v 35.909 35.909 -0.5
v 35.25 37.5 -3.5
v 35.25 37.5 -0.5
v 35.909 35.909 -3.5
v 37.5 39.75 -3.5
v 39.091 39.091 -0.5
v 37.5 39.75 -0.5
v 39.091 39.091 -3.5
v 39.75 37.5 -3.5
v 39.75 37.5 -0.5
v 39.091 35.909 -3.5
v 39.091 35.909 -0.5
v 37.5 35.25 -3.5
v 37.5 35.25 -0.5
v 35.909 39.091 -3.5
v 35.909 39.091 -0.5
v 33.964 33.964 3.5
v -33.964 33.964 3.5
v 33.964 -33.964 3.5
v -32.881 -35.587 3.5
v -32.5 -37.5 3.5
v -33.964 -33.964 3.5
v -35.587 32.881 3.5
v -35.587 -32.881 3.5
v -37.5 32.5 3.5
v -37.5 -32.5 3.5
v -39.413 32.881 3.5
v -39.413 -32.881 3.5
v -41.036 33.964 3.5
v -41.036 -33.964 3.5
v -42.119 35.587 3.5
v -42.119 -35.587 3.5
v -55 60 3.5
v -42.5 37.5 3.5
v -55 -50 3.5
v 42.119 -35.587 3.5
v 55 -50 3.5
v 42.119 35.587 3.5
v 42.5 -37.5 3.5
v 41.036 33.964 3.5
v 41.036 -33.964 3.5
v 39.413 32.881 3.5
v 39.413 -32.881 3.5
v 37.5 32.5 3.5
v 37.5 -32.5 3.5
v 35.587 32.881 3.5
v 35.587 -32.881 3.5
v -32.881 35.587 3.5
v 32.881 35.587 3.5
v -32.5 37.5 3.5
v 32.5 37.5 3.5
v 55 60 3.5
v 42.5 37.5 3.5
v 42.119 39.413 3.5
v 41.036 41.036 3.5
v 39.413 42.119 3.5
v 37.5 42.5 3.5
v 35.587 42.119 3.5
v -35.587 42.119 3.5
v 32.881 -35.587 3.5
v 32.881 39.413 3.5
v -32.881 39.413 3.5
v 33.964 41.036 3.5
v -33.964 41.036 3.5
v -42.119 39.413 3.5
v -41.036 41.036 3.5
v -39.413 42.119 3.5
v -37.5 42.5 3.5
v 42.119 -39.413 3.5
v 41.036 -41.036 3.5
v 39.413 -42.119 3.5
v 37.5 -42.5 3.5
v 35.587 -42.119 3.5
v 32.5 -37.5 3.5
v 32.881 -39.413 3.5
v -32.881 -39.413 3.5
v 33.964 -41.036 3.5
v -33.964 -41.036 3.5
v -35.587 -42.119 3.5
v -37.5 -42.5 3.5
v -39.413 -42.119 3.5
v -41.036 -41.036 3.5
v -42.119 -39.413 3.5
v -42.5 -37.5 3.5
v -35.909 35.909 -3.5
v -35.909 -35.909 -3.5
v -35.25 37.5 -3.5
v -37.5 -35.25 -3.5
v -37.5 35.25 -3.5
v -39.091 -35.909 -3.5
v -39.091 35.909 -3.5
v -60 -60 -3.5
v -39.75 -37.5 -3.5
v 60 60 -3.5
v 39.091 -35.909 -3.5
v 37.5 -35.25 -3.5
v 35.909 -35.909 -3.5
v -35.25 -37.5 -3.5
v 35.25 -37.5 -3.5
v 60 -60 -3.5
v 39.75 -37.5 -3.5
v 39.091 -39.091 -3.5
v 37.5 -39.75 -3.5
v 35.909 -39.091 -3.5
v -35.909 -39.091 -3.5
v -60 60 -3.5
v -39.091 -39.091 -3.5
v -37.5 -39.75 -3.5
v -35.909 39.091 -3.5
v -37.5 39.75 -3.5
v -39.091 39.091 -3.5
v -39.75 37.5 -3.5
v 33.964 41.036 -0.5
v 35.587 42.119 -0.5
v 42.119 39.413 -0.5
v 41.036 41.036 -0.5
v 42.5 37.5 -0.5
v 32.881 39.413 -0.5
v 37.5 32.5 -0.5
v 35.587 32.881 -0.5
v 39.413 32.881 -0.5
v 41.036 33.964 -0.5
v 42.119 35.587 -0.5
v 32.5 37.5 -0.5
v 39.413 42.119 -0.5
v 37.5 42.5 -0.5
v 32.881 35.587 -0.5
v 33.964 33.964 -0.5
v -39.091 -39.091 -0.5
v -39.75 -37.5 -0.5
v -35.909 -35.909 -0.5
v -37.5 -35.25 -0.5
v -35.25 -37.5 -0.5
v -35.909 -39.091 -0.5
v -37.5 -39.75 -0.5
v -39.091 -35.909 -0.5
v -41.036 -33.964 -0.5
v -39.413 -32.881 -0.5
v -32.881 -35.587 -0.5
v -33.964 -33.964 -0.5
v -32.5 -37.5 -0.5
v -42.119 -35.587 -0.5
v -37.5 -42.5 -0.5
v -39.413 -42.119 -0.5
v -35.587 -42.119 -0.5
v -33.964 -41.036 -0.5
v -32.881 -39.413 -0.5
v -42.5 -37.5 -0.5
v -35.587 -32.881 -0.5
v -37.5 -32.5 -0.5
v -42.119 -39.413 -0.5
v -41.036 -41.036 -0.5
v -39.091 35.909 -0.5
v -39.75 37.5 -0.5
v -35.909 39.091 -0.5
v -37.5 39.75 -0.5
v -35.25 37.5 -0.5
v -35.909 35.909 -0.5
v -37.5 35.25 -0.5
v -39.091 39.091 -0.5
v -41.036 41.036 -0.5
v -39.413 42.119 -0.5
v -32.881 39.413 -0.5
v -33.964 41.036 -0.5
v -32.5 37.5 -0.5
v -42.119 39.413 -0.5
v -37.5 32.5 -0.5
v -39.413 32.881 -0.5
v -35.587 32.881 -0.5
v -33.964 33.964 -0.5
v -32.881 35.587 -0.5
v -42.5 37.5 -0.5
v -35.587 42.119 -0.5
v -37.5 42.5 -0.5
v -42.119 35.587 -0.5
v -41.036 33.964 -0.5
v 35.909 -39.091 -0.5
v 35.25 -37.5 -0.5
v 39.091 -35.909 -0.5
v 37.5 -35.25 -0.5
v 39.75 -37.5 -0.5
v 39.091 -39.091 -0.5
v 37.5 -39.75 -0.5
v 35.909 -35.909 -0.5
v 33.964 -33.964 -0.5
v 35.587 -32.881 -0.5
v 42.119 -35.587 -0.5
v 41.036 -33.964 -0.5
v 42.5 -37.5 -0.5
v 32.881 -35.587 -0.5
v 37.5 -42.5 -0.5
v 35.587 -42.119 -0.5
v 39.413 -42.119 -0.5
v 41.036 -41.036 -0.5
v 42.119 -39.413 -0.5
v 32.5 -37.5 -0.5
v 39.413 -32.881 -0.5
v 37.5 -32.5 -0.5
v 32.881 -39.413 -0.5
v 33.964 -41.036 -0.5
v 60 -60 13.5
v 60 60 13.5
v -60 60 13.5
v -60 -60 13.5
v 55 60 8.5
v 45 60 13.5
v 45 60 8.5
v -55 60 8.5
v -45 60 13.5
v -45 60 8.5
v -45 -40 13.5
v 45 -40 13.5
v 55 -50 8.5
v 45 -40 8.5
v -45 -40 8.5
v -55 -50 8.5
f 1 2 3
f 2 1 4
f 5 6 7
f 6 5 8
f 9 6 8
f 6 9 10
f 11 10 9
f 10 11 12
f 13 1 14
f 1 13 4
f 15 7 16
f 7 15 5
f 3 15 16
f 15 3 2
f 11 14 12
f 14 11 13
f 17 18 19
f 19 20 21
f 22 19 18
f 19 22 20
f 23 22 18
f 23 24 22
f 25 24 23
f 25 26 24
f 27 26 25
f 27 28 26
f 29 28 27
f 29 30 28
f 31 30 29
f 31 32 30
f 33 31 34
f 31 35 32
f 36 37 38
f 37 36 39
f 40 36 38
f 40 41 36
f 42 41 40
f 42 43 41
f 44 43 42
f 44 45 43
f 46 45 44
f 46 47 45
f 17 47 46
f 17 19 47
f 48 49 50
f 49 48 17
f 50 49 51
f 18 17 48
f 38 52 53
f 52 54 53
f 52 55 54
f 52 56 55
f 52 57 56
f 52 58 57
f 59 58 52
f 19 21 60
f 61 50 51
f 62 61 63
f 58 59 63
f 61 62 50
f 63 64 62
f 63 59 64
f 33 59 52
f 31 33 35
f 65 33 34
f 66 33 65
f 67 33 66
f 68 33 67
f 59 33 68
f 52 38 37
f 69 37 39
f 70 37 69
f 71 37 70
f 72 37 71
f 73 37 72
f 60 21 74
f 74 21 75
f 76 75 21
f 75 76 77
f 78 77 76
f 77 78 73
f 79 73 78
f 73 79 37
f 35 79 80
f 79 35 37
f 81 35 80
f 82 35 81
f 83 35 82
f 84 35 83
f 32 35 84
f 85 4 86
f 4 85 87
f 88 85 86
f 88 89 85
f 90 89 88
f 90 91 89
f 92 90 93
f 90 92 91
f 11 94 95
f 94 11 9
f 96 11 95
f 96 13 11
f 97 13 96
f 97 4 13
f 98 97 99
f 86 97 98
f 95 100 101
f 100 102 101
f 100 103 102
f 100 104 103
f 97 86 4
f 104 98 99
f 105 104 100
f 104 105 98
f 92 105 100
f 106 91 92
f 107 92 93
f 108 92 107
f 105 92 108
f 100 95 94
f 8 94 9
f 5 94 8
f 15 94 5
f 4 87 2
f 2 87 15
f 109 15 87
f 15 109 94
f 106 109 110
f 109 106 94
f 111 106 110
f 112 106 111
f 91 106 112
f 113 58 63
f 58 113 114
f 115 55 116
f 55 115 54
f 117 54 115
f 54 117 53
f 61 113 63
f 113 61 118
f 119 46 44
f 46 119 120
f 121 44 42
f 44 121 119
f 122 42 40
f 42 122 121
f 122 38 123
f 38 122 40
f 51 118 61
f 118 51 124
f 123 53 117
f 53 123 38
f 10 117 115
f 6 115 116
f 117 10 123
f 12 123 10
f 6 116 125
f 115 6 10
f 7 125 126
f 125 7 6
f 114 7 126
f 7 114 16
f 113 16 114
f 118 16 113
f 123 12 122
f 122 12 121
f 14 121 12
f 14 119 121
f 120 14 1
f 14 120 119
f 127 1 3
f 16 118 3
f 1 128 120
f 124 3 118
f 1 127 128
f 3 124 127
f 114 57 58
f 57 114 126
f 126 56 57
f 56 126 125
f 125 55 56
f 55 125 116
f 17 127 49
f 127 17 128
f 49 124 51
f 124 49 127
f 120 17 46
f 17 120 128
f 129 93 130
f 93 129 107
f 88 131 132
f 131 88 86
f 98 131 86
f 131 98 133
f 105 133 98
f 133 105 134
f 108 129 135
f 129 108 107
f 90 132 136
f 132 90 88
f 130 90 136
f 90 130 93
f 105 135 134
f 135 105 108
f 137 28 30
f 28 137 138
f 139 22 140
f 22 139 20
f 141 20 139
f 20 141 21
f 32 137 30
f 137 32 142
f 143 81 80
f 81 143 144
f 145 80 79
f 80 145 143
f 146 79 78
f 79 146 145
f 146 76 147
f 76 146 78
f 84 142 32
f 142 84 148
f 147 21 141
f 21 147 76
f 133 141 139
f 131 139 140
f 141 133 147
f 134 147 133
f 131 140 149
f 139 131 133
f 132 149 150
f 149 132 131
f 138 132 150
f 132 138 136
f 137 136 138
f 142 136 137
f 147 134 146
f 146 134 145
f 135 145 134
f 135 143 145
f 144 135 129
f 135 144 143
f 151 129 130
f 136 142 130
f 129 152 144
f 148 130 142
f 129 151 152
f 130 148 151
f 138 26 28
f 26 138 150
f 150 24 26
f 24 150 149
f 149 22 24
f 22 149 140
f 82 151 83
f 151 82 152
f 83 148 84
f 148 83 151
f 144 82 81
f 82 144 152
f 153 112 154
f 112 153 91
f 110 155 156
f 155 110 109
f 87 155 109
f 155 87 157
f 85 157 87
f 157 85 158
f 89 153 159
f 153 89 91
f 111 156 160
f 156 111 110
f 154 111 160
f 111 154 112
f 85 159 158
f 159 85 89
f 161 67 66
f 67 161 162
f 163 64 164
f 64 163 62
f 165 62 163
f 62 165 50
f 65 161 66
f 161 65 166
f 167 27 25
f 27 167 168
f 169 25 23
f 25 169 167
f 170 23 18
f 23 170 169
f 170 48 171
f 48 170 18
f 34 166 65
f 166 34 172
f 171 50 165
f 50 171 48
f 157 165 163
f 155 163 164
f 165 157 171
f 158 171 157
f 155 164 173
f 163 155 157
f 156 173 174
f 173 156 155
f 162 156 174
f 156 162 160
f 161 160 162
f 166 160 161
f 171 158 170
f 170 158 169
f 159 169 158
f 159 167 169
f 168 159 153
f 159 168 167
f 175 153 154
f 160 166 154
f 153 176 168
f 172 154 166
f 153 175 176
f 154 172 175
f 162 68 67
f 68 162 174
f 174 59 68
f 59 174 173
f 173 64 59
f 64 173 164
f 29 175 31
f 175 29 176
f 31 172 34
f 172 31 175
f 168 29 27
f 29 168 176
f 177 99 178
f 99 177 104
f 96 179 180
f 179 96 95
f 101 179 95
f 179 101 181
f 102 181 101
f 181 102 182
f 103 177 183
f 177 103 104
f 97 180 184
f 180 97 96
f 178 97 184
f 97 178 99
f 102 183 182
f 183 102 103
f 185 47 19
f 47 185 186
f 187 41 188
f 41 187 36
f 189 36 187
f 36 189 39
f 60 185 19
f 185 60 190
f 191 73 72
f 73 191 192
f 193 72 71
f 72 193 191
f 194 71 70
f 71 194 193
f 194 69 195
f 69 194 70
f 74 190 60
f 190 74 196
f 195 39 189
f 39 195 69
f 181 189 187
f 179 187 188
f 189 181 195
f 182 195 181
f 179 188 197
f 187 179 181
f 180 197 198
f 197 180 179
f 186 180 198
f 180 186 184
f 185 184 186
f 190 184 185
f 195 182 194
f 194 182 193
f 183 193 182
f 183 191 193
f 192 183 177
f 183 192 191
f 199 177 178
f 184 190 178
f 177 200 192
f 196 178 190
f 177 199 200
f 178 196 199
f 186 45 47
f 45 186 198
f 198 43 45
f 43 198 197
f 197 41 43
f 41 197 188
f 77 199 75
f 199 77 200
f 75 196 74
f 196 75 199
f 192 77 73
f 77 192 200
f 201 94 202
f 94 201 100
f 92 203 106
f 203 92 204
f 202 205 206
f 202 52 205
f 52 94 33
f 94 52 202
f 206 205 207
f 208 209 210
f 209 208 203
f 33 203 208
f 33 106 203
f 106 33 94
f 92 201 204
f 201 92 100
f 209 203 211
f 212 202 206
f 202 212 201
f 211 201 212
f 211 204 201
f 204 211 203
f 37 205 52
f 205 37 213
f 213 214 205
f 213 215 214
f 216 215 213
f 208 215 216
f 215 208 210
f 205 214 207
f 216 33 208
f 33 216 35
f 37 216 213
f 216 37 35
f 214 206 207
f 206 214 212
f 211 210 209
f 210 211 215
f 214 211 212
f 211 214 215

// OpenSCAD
// vesa wall mount 75mm


vesa_size = 75;
plate_size = 120;

plate_width = 7;

hole_d1 = 4.5;
hole_d2 = 10;
hole_h2 = 4;
hole_h1 = plate_width;

slot_h = 5;
slot_side_wall = 5;
slot_top_wall = 10;
slot_overlap = 10;
slot_overlap_h = 5;

module hole(h1=hole_h1, d1=hole_d1, h2=hole_h2, d2=hole_d2, rot=0) {
    rotate([rot, 0, 0]) {
     cylinder(d=d1, h=h1, center=true);
     translate([0, 0, 0.5*(h1-h2)]) cylinder(d=d2, h=h2, center=true);
    }
    
}
module vesa_holes(h=hole_h1, r=0) {
    off = 0.5*vesa_size;
    translate([off, off, 0]) hole(h1=h, rot=r);
    translate([-off, -off, 0]) hole(h1=h, rot=r);
    translate([-off, off, 0]) hole(h1=h, rot=r);
    translate([off, -off, 0]) hole(h1=h, rot=r);
}


module plate() {
    x = plate_size;
    z = plate_width;
    z1 = slot_h + slot_overlap_h;
    difference() {
      cube([x, x, z], center=true);
      vesa_holes();
    }
    translate([0, 0, 0.5*(z+z1)]) cube([x, x, z1], center=true);
}

module wall_plate(tol=0, add=0) {
    x = plate_size - 2*slot_side_wall + tol;
    y = plate_size - slot_top_wall + tol;
    z = slot_h + tol;
    x1 = x - 2*slot_overlap + tol;
    y1 = y - slot_overlap + tol;
    z1 = slot_overlap_h + tol + add;
    translate([0, 0.5*slot_top_wall, 0]) cube([x, y, z], center=true);
    translate([0, 0.5*(slot_top_wall+slot_overlap), 0.5*(z + z1)]) cube([x1, y1, z1], center=true);
}

module vesa_plate() {
    difference() {
      plate();
      translate([0, 0, 0.5*(plate_width+slot_h)]) wall_plate();
    }
}

module wall_plate_with_holes() {
    add=5;
    tol=-2;
    h = slot_h + slot_overlap_h + add + 2*tol;
    tr_h = slot_h + tol;
    difference() {
      wall_plate(tol=tol, add=add);
      translate([0, 10, 0.5*(h-tr_h)]) vesa_holes(h=h, r=180);
    }
}
//hole();
//plate();
//translate([0, 0, 0.5*(plate_width+slot_h)]) wall_plate();
vesa_plate();
//translate([0, 0, 0.5*(plate_width+slot_h)]) 
//  wall_plate_with_holes();
